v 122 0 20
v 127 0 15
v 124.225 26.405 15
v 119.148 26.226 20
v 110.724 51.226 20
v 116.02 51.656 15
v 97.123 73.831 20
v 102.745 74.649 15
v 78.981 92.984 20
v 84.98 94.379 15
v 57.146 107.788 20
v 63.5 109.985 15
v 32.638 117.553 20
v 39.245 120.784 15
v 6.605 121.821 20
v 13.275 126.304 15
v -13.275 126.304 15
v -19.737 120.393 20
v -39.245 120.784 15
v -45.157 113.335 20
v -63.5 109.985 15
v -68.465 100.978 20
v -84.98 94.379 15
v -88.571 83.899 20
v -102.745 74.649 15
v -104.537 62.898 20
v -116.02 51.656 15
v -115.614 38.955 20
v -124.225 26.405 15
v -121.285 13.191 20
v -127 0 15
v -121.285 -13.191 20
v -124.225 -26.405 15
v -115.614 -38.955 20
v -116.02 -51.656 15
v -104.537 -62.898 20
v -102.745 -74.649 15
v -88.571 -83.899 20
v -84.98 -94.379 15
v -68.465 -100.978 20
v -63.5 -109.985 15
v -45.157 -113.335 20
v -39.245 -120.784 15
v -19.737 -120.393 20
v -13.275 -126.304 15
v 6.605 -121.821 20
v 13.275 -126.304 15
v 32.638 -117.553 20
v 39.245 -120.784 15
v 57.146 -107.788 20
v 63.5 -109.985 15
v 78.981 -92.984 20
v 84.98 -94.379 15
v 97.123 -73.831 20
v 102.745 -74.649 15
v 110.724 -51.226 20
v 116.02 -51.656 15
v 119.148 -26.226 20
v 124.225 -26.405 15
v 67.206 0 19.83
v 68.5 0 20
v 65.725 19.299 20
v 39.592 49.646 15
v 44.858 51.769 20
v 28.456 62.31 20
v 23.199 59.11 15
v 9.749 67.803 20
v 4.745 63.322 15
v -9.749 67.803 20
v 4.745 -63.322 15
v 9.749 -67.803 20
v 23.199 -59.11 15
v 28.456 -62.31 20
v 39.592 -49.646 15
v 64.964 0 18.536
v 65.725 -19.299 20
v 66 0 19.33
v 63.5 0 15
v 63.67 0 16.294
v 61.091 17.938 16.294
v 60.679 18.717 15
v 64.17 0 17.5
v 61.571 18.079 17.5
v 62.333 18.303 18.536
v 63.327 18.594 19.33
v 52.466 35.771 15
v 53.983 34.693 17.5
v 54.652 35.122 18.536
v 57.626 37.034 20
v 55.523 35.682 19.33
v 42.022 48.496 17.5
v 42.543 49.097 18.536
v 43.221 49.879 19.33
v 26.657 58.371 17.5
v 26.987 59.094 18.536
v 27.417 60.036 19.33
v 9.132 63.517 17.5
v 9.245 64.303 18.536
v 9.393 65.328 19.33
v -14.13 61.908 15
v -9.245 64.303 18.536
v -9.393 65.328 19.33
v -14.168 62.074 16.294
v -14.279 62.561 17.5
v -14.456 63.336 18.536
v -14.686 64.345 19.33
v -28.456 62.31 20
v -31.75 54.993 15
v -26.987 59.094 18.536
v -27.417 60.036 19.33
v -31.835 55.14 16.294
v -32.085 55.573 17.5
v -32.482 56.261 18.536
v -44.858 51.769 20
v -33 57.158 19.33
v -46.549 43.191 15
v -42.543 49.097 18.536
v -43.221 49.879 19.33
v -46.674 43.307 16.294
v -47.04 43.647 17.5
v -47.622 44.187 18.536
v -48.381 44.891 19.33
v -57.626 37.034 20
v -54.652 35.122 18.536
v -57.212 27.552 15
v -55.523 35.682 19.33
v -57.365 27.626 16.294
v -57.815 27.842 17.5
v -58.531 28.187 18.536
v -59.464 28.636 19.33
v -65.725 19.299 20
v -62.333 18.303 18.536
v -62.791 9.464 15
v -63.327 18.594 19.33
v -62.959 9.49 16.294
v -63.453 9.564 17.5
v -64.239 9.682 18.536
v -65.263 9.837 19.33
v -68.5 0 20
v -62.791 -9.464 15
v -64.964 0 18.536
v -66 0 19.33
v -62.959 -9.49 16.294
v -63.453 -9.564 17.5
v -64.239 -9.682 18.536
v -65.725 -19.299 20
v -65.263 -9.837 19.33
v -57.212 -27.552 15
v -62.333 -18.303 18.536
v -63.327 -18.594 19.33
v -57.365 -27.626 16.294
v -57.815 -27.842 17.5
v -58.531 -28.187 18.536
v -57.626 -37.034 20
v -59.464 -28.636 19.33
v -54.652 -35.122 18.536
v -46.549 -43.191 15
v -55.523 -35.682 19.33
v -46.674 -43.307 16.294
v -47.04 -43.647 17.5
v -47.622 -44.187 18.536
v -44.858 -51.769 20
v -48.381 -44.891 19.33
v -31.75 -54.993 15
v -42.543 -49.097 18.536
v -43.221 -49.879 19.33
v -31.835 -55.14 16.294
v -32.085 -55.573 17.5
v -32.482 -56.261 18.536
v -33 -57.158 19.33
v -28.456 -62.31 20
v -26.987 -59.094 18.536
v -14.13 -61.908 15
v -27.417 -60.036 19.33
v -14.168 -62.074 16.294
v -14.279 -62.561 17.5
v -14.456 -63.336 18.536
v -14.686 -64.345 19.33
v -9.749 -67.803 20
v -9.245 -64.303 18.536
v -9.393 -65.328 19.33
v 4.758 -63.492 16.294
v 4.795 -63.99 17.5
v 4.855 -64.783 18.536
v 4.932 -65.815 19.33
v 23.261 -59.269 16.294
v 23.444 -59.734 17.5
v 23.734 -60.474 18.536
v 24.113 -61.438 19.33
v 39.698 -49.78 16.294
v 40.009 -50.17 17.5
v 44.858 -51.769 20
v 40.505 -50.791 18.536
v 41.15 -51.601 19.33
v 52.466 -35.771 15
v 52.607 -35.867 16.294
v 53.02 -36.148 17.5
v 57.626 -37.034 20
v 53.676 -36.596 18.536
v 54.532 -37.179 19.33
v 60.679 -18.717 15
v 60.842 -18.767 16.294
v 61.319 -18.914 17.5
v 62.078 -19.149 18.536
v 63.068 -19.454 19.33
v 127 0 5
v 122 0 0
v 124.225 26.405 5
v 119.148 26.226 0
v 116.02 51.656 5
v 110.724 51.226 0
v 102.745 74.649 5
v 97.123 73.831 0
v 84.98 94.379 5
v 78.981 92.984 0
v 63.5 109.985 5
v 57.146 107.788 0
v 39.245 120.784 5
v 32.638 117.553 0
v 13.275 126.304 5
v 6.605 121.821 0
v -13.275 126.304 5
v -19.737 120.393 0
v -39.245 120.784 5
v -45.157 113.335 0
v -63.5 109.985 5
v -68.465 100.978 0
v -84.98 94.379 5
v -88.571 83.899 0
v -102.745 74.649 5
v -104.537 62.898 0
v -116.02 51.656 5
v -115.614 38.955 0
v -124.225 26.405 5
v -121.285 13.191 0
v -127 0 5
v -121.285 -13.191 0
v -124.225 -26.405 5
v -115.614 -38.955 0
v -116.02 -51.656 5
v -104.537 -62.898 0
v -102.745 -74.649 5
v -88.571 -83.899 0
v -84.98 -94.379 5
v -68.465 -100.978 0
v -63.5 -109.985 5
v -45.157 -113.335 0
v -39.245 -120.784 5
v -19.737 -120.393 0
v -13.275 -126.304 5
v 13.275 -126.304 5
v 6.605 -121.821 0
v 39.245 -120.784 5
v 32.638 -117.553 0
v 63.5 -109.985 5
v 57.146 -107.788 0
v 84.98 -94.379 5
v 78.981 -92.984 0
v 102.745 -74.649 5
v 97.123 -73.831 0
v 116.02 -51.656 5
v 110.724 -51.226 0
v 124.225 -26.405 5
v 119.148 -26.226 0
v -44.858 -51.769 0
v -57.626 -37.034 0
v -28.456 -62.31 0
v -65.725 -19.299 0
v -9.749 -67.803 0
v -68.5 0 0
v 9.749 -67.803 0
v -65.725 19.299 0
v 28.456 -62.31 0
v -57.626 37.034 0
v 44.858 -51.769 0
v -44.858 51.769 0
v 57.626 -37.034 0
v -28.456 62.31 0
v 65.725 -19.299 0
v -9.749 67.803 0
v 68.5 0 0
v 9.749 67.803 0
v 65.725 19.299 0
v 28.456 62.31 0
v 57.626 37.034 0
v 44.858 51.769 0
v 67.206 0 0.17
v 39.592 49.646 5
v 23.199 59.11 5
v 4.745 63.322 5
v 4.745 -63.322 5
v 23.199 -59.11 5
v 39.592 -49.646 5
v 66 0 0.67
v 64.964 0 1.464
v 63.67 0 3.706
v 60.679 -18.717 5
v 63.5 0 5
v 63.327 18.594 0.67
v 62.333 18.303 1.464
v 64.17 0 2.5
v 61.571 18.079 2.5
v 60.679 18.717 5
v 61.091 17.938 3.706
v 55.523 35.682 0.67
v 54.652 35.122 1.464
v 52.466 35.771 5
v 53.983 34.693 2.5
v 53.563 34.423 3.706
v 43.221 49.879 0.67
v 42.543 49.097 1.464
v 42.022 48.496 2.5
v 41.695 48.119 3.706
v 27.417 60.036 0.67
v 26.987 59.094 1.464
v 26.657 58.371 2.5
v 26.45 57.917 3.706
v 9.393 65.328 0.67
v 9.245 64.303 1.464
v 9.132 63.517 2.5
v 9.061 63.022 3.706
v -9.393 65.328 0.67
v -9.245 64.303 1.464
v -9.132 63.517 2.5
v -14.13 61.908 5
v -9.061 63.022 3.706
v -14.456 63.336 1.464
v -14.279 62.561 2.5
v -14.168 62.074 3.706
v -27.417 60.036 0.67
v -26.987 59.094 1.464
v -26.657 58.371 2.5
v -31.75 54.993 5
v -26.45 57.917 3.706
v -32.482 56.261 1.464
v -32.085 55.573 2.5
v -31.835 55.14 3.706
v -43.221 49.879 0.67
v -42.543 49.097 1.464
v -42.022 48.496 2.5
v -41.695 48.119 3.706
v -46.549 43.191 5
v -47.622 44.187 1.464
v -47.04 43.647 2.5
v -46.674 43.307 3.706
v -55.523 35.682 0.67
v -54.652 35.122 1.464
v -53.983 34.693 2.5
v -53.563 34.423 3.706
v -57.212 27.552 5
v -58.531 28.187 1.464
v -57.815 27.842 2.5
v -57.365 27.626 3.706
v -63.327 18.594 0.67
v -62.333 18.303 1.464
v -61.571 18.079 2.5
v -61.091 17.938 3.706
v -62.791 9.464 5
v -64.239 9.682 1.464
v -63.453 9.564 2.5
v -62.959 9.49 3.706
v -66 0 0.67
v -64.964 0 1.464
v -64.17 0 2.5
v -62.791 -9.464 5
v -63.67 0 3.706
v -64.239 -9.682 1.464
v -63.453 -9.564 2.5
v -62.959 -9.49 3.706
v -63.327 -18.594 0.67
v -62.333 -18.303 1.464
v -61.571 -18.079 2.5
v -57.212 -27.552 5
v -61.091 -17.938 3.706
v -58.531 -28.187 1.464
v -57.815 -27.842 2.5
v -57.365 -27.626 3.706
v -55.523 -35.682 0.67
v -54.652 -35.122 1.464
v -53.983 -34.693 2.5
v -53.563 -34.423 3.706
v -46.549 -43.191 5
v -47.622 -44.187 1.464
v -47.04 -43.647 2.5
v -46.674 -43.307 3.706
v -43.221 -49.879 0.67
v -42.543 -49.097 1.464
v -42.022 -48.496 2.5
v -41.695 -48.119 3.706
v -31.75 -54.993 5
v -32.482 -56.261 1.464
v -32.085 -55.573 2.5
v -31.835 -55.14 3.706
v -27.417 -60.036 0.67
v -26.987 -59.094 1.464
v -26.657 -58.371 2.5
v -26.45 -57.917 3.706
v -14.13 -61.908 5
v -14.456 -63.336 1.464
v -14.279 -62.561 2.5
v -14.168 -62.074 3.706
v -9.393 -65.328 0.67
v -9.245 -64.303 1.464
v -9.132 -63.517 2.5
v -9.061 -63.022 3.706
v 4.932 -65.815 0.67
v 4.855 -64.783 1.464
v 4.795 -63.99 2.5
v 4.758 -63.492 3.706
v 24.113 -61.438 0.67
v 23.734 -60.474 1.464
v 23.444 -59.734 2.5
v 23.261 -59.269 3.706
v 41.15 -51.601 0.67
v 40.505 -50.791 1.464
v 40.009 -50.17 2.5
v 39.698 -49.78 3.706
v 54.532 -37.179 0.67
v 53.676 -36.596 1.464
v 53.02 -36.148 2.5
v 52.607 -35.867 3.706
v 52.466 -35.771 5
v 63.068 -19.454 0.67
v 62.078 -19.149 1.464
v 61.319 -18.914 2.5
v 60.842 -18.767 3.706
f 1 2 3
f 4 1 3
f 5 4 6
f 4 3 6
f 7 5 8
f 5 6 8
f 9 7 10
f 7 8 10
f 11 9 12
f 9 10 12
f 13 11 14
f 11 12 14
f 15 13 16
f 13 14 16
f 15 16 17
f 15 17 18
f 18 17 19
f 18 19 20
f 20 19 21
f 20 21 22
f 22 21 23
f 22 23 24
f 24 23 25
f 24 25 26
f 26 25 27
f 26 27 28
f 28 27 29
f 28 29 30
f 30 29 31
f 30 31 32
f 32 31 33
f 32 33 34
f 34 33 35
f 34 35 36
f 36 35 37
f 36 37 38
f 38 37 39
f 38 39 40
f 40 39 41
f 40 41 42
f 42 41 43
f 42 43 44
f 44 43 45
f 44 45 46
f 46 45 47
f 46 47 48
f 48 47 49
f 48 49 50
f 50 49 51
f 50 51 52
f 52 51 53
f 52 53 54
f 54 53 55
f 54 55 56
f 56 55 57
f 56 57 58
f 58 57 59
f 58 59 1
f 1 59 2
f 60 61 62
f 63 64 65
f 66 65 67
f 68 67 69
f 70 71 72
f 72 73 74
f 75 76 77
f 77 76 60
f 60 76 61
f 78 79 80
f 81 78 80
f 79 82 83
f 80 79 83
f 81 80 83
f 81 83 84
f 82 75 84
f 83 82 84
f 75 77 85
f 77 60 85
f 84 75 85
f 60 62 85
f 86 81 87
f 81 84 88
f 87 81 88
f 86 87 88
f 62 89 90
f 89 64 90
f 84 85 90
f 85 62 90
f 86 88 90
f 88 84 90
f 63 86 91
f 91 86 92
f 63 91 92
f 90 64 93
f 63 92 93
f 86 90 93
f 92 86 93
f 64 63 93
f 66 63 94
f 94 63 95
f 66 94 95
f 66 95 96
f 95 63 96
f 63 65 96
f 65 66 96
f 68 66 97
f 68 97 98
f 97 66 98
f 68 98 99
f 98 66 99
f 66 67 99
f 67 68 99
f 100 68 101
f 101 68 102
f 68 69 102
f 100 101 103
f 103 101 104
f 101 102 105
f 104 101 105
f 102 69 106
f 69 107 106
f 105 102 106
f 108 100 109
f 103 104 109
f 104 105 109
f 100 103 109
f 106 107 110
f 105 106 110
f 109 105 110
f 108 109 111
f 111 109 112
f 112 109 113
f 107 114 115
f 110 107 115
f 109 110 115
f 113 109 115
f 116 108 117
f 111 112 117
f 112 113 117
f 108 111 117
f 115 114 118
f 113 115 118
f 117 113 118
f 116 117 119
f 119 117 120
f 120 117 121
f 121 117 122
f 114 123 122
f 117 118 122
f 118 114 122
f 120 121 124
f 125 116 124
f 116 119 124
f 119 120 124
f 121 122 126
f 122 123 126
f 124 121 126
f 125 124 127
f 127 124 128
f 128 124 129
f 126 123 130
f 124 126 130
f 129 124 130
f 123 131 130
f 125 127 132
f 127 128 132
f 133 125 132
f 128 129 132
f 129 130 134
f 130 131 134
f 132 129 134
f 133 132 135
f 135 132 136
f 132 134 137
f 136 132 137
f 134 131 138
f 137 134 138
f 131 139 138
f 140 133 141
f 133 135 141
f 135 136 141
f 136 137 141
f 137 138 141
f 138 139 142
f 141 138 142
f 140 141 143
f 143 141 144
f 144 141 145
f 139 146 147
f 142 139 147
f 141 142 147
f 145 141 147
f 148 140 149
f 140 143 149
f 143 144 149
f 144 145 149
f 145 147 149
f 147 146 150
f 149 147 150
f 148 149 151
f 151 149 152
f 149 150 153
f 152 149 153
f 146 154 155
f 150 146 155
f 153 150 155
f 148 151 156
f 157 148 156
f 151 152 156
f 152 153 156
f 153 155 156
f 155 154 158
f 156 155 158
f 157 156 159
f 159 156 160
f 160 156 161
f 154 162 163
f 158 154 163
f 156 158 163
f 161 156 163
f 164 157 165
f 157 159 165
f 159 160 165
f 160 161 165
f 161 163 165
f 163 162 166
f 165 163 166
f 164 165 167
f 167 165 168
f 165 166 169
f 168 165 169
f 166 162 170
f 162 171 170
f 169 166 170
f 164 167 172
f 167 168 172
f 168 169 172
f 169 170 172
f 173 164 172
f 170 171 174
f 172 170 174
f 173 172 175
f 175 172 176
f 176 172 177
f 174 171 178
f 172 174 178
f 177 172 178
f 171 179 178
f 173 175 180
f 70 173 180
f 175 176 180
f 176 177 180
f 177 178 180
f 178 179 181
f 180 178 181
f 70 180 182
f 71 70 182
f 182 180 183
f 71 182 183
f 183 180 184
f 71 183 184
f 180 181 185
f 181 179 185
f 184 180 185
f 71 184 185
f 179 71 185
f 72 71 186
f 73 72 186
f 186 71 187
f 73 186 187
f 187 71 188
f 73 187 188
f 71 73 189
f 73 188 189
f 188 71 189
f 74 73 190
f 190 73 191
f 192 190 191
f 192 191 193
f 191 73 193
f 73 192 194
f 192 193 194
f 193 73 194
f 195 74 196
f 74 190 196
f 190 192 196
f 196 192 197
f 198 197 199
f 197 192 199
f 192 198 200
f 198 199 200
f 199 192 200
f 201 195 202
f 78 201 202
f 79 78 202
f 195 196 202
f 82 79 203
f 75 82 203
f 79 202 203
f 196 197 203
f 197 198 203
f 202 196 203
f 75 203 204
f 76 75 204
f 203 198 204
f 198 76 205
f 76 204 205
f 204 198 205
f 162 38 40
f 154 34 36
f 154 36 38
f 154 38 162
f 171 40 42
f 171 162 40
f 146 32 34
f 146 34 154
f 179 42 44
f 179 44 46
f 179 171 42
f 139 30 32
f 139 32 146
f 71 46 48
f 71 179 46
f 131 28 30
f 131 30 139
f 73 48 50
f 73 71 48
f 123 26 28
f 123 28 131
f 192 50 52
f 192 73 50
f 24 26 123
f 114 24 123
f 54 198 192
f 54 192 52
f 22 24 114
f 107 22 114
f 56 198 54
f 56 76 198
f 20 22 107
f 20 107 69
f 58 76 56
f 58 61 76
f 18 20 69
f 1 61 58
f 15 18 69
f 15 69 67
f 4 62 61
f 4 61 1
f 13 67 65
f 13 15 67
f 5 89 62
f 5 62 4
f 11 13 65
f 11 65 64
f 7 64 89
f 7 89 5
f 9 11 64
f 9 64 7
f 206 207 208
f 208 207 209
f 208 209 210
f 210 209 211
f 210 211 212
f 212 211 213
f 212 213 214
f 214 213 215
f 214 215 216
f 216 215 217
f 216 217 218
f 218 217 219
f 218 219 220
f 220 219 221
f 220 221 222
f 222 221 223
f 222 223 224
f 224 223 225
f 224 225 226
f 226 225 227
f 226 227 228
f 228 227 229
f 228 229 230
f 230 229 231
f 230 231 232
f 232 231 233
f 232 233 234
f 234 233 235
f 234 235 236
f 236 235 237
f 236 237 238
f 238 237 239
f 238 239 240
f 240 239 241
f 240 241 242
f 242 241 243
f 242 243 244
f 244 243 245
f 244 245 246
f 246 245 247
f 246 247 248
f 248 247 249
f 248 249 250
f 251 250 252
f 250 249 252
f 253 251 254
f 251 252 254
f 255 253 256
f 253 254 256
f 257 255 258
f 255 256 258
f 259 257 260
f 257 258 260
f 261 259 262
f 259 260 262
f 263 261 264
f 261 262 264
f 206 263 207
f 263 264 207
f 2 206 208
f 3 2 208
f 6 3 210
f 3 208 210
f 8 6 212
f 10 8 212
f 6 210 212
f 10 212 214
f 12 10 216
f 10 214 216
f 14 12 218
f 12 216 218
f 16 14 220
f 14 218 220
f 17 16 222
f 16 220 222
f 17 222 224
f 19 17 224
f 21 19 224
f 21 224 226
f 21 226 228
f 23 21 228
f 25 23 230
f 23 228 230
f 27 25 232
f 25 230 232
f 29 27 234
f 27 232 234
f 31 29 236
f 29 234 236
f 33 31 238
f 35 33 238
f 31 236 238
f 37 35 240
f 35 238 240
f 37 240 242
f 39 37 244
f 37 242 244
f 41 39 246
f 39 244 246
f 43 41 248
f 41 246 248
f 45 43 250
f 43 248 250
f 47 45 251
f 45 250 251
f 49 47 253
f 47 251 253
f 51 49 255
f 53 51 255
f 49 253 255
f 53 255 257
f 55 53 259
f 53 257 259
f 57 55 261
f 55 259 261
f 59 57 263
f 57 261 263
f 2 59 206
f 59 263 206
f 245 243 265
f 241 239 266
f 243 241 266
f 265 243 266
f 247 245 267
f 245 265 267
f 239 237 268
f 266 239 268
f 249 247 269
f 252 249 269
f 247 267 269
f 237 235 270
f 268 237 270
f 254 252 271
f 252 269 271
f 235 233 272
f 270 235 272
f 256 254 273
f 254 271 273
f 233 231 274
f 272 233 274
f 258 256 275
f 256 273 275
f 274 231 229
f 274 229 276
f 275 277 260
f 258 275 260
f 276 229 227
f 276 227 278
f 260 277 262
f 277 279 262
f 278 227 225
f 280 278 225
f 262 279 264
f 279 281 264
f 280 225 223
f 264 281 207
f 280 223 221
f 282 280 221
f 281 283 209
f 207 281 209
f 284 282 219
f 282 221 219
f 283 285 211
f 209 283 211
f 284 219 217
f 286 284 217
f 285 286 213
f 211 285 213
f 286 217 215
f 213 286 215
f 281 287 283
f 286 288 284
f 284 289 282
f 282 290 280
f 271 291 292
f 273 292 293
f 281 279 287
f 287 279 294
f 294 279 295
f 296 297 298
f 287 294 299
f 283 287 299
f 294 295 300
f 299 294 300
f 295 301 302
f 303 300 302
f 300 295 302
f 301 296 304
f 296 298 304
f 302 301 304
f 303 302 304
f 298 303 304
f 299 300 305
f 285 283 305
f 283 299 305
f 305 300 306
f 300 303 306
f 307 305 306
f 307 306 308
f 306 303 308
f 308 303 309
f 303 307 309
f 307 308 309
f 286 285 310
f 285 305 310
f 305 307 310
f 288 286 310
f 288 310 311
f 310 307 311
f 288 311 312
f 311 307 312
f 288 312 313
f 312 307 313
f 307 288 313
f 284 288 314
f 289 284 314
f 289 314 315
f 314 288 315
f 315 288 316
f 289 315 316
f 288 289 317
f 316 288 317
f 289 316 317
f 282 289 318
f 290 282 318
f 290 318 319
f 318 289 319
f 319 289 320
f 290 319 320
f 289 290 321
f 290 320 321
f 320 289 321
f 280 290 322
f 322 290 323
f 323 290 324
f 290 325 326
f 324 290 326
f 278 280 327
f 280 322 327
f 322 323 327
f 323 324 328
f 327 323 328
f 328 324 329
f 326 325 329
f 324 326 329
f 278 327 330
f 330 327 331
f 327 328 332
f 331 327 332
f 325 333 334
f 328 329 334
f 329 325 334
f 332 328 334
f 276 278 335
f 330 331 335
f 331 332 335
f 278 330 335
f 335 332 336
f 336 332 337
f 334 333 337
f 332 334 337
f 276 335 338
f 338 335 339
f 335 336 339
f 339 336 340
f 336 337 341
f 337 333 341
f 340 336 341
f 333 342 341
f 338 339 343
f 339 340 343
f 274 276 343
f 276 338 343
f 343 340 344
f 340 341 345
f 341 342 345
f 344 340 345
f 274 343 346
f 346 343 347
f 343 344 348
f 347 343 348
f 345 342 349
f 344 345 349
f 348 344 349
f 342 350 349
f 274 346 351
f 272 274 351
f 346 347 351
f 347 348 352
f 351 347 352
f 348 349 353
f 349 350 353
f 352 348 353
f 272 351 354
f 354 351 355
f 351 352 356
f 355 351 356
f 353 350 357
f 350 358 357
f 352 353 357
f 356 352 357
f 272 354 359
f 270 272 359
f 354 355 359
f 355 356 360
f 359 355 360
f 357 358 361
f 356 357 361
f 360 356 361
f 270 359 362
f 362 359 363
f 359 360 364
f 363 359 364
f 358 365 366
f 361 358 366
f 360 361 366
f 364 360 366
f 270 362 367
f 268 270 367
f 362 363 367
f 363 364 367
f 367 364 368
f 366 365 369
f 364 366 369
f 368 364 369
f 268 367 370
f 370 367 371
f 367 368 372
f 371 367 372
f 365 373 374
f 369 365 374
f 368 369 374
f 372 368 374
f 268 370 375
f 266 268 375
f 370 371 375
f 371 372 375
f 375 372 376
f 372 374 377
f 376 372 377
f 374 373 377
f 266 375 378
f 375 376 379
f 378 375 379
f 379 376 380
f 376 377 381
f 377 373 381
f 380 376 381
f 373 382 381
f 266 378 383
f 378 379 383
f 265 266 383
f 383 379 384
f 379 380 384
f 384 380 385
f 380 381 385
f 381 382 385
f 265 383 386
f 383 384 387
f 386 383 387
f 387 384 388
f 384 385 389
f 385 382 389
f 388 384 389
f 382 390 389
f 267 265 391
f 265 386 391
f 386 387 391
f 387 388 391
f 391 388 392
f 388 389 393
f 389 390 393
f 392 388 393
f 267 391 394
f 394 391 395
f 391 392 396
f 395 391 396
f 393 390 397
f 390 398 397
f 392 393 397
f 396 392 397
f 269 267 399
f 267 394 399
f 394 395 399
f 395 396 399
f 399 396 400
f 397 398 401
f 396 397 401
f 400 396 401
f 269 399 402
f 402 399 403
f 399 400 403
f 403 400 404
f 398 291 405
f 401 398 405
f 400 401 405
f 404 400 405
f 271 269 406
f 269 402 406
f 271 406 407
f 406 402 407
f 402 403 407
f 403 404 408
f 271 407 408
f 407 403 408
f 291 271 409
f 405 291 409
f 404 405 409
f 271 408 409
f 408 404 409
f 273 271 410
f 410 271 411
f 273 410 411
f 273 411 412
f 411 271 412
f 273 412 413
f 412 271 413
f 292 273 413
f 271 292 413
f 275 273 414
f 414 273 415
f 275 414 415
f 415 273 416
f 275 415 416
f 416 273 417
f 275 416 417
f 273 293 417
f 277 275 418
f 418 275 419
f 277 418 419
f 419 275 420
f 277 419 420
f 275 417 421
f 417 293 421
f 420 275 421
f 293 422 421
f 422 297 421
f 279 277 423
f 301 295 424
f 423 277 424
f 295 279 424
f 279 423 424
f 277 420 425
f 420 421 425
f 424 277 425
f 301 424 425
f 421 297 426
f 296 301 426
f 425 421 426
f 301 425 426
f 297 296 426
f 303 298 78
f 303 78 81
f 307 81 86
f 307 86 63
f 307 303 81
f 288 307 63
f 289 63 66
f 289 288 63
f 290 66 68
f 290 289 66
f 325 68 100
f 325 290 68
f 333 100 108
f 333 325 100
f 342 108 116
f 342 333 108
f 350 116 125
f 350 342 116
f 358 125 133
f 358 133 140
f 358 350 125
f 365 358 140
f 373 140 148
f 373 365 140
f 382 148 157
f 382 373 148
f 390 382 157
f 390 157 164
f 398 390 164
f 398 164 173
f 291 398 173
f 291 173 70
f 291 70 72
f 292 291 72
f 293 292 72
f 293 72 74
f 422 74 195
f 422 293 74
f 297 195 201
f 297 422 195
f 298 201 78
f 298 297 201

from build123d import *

# Parameters (mm, degrees)
F0_R     = 127
F0_R_2   = 63.5
F1_DEPTH = 20
F2_R     = 5
F3_SIZE  = 5
F4_SIZE  = 5
F5_R     = 5


with BuildPart() as f1:
    # F0 (on Top) → F1 (new body)
    with BuildSketch(Plane.XY):
        Circle(F0_R)
        Circle(F0_R_2, mode=Mode.SUBTRACT)
    extrude(amount=F1_DEPTH)

    # F2
    f2_edges = [f1.edges().sort_by_distance(p)[0] for p in [
        (-63.5, 0, 20),
    ]]
    fillet(f2_edges, radius=F2_R)

    # F3
    f3_edges = [f1.edges().sort_by_distance(p)[0] for p in [
        (-127, 0, 20),
    ]]
    chamfer(f3_edges, length=F3_SIZE)

    # F4
    f4_edges = [f1.edges().sort_by_distance(p)[0] for p in [
        (-127, 0, 0),
    ]]
    chamfer(f4_edges, length=F4_SIZE)

    # F5
    f5_edges = [f1.edges().sort_by_distance(p)[0] for p in [
        (-63.5, 0, 0),
    ]]
    fillet(f5_edges, radius=F5_R)


solid = f1.part
